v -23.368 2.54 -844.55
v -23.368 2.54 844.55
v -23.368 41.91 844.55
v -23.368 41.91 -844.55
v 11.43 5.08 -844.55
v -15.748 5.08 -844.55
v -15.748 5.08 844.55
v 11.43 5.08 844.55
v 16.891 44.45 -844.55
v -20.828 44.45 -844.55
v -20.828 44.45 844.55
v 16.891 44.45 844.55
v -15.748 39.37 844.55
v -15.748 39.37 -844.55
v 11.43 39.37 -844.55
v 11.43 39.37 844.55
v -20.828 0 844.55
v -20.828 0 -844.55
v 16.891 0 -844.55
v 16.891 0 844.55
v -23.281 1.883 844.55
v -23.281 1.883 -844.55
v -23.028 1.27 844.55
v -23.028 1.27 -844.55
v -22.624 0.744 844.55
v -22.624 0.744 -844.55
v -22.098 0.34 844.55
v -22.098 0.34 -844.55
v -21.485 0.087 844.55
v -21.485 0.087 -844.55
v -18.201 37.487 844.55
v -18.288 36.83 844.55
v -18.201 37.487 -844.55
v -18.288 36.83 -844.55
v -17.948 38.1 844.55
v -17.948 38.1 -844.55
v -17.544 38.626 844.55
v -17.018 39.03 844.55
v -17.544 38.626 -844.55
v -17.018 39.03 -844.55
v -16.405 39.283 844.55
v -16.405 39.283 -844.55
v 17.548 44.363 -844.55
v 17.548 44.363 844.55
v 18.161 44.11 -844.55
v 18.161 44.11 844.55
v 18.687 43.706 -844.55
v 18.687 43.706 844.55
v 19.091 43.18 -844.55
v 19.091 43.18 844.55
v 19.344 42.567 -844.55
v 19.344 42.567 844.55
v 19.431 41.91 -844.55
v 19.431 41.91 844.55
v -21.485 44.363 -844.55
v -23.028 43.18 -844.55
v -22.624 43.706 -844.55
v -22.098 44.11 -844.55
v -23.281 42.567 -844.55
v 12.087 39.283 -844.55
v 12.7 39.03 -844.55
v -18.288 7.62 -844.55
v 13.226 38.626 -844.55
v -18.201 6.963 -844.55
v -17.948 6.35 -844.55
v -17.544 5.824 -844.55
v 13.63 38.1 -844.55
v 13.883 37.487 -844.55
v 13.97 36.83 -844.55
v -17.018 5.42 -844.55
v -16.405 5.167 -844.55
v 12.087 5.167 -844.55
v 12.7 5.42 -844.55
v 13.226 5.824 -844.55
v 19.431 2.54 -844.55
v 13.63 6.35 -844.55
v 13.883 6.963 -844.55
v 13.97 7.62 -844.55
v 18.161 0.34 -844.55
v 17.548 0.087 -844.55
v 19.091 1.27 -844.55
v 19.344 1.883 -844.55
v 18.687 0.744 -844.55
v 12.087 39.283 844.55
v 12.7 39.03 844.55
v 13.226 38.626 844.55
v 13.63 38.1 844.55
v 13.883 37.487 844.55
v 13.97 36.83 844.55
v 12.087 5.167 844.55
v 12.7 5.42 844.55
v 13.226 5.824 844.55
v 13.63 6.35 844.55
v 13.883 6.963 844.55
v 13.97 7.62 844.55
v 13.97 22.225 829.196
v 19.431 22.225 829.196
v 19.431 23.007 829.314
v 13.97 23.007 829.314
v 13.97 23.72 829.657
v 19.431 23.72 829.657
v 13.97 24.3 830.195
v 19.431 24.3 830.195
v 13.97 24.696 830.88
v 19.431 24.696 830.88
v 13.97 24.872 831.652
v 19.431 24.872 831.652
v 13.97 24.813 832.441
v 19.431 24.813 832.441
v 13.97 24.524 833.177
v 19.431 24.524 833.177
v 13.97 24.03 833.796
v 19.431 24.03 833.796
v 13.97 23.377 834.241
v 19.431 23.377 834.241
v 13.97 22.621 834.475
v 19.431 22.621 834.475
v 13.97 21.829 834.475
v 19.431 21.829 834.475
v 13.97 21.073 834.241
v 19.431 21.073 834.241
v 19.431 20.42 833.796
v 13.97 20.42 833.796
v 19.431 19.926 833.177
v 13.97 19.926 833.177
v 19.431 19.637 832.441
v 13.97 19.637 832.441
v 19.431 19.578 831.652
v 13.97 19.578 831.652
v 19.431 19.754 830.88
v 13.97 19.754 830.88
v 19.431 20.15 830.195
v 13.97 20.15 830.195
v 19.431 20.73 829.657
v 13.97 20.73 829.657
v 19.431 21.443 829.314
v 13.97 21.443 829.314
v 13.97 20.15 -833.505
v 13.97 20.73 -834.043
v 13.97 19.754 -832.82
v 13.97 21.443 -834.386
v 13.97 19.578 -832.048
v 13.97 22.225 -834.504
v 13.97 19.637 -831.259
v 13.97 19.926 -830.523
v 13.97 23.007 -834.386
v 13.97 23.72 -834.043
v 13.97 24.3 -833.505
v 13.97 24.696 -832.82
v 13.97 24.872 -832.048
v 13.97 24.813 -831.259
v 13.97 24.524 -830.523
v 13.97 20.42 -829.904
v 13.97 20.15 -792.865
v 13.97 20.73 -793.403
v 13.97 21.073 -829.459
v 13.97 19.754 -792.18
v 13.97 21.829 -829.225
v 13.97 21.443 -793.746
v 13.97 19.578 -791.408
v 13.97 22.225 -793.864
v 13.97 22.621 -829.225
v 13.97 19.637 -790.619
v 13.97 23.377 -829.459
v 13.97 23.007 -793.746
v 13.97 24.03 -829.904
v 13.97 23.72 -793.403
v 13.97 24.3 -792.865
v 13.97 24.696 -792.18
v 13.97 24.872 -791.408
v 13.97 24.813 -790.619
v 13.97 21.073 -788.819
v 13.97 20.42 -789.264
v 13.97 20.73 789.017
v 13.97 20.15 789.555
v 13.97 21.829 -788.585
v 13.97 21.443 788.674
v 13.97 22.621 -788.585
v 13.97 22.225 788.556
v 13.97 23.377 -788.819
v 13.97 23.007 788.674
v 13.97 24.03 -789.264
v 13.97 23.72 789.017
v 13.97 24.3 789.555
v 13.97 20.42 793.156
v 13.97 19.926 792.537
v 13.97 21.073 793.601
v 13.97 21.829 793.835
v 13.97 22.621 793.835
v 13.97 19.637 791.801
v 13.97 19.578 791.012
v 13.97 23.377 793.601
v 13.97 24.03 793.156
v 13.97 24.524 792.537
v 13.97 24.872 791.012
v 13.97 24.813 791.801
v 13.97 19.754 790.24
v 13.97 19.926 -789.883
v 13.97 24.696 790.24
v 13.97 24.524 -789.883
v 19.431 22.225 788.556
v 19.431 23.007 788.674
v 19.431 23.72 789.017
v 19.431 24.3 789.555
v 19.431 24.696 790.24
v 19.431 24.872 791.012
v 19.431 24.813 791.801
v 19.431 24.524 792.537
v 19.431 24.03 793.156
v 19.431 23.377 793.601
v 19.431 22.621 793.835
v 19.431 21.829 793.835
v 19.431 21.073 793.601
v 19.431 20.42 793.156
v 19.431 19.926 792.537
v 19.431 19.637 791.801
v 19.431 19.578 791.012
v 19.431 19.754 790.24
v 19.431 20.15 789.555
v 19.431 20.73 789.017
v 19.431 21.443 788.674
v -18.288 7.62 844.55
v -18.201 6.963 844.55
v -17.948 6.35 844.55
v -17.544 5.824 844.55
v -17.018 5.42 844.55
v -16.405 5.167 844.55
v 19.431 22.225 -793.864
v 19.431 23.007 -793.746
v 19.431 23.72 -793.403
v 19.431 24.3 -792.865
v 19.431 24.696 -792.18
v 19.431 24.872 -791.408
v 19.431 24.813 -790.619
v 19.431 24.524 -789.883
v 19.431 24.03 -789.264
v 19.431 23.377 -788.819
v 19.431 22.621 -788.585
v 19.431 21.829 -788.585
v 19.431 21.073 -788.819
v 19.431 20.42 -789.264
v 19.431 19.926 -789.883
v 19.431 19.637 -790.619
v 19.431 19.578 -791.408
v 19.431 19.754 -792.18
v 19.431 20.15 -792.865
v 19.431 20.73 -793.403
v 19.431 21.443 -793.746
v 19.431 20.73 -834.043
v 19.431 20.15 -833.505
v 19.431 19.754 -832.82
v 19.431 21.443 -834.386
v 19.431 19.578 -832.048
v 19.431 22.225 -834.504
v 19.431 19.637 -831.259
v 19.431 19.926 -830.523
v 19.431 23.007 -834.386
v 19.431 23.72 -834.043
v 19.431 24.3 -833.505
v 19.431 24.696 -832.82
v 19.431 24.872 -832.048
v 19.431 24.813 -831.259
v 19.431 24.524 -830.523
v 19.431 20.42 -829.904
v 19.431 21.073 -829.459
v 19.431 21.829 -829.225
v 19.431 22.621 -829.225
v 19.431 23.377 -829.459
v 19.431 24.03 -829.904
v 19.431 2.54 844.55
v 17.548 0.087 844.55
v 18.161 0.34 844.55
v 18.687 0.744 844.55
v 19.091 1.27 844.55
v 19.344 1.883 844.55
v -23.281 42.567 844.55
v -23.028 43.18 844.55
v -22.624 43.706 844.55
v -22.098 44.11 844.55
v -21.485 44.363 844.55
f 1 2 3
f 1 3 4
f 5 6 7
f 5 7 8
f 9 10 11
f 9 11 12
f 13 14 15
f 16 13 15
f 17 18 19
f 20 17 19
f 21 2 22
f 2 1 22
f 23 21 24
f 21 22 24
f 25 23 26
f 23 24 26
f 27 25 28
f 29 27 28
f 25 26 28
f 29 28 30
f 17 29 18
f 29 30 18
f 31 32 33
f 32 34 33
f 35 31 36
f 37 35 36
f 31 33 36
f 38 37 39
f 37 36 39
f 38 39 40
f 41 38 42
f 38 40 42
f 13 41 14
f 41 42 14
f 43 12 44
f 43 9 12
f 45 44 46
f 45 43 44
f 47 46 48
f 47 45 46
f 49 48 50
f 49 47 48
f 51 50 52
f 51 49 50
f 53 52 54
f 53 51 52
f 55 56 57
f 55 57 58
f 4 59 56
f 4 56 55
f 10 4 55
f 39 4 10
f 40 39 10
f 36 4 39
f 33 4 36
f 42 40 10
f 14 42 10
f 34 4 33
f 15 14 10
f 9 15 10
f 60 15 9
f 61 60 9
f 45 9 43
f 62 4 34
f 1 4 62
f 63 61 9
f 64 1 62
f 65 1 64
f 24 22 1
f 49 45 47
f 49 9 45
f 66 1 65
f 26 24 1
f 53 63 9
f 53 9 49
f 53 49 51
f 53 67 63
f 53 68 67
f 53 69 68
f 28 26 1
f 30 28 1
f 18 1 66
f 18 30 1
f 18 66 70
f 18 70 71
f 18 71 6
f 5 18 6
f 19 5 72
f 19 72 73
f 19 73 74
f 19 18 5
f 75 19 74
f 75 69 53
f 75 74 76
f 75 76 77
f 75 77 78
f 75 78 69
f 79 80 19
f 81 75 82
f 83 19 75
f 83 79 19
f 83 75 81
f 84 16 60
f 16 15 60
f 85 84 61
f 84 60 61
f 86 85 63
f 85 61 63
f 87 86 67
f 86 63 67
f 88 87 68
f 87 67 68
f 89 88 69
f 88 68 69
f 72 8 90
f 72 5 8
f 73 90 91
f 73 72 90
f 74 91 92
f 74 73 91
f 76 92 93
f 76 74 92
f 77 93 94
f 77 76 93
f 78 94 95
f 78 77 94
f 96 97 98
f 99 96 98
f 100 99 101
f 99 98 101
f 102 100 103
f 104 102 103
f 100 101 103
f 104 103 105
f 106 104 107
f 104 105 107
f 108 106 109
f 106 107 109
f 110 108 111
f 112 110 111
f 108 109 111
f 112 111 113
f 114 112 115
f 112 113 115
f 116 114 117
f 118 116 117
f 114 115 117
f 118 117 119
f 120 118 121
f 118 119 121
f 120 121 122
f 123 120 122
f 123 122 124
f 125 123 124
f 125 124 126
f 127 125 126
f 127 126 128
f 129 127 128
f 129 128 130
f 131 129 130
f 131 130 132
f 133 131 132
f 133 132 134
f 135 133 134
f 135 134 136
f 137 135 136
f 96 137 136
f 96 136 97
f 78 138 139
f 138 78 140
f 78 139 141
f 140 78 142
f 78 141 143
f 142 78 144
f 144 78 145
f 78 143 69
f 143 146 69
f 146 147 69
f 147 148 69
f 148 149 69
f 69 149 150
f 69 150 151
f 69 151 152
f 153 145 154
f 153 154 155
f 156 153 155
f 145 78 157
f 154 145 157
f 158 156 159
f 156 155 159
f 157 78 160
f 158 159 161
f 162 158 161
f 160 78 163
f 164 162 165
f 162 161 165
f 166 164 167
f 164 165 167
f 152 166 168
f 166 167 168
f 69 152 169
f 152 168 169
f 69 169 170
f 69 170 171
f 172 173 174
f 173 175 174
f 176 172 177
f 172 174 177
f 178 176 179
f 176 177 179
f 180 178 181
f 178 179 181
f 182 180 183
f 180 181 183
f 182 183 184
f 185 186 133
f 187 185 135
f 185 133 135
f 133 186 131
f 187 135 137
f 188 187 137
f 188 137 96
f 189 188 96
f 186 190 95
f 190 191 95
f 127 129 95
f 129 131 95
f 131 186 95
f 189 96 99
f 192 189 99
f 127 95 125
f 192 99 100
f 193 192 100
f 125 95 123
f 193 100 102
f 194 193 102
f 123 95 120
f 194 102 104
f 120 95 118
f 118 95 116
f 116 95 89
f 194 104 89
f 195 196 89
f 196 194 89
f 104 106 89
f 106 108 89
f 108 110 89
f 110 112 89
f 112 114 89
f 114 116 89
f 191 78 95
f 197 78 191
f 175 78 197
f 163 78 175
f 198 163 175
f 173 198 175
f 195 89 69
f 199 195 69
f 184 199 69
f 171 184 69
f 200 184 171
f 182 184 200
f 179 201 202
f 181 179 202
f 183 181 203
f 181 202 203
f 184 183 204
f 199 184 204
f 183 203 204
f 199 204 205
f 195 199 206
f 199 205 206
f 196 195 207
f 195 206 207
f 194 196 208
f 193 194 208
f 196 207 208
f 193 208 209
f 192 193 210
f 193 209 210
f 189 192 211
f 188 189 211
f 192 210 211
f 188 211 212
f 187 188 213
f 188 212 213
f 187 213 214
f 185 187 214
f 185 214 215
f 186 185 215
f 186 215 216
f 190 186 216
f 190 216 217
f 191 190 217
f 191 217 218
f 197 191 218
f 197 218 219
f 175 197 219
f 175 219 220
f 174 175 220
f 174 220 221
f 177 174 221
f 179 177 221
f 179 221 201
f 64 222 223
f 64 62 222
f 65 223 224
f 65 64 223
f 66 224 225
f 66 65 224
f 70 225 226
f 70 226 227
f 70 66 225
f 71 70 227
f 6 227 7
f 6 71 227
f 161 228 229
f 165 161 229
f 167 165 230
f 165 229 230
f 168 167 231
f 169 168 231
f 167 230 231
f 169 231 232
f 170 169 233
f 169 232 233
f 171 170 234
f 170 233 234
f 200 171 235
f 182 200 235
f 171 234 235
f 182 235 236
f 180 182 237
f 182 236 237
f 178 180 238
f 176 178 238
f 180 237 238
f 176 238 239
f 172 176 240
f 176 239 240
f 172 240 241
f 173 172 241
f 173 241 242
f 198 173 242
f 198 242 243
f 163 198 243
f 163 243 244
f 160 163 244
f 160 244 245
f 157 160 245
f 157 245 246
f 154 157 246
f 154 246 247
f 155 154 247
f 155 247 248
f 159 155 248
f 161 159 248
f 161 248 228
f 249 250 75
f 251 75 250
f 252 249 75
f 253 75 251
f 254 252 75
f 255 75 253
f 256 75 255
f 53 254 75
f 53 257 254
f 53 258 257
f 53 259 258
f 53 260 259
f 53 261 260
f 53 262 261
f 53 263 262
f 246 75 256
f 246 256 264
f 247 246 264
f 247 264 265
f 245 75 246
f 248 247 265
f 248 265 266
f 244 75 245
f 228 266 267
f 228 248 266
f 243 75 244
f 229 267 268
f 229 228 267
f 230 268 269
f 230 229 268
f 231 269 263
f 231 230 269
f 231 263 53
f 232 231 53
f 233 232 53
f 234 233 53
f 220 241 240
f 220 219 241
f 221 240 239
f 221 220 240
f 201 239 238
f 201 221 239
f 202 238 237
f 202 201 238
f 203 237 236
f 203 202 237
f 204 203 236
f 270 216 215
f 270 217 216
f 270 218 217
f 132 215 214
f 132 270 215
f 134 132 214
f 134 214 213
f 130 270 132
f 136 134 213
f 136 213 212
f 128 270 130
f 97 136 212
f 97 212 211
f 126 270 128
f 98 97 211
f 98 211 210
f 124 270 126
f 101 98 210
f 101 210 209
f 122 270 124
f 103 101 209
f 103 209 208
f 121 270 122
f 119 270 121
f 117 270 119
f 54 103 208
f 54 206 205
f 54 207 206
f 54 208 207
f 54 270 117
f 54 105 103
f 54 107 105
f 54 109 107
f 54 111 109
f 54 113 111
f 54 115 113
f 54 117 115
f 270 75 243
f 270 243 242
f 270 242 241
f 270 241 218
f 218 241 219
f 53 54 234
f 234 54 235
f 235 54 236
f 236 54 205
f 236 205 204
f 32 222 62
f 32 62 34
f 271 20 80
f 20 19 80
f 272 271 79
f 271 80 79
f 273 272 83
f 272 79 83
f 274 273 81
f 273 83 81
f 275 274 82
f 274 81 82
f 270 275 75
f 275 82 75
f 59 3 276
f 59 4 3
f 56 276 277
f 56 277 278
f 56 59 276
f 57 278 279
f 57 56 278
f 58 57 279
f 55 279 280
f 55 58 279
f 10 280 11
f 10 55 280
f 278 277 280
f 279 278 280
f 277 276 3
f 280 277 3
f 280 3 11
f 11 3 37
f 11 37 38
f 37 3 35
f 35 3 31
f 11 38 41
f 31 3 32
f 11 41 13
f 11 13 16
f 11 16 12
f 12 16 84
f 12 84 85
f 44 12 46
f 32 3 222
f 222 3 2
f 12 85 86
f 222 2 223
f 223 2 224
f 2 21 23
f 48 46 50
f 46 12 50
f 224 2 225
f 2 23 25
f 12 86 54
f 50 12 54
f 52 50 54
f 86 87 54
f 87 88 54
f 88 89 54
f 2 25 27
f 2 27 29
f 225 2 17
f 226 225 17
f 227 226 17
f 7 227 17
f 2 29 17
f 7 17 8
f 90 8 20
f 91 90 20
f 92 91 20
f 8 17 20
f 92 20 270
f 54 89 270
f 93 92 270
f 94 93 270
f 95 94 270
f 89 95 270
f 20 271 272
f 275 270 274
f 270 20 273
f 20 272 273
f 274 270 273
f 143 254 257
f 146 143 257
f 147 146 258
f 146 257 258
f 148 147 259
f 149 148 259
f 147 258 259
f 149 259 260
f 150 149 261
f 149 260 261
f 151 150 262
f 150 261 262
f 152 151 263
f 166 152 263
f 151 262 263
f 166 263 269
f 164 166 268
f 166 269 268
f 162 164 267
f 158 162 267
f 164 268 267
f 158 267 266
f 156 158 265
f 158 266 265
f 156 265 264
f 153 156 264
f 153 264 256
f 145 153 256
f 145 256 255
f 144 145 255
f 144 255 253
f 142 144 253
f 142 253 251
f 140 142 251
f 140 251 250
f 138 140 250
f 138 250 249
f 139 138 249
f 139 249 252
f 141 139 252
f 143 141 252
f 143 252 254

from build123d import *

# Parameters (mm, degrees)
MAIN_W                         = 46.736
MAIN_H                         = 1689.1
EXTRUDE_MAIN_DEPTH             = 44.45
MAIN_CUT_W                     = 32.258
MAIN_CUT_H                     = 34.29
CUT_MAIN_DEPTH                 = 1690.846346839
SKETCH1_W                      = 3.937
SKETCH1_H                      = 44.45
CUT_EXTRUDE1_DEPTH             = 1690.846346839
F_4_0_209_DIAMETER_HOLE2_D     = 5.3086
F_4_0_209_DIAMETER_HOLE2_DEPTH = 5.461
FILLET1_R                      = 2.54


with BuildPart() as part:
    # Main → Extrude-Main (new body)
    with BuildSketch(Plane(origin=(0, 0, 0), x_dir=(1, 0, 0), z_dir=(0, 1, 0))):
        Rectangle(MAIN_W, MAIN_H)
    extrude(amount=EXTRUDE_MAIN_DEPTH)

    # Main Cut → Cut-Main (cut, through all)
    with BuildSketch(Plane.XY.offset(844.55)):
        with Locations((-2.159, 22.225)):
            Rectangle(MAIN_CUT_W, MAIN_CUT_H)
    extrude(amount=-CUT_MAIN_DEPTH, mode=Mode.SUBTRACT)

    # Sketch1 → Cut-Extrude1 (cut, through all)
    with BuildSketch(Plane.XY.offset(844.55)):
        with Locations((21.3995, 22.225)):
            Rectangle(SKETCH1_W, SKETCH1_H)
    extrude(amount=-CUT_EXTRUDE1_DEPTH, mode=Mode.SUBTRACT)

    # #4 (0.209) Diameter Hole2
    with Locations(Plane.ZY.offset(-13.97)):
        with Locations((831.85, 22.225), (-831.85, 22.225), (-791.21, 22.225), (791.21, 22.225)):
            Hole(F_4_0_209_DIAMETER_HOLE2_D / 2, depth=F_4_0_209_DIAMETER_HOLE2_DEPTH)

    # Fillet1
    fillet1_edges = [part.edges().sort_by_distance(p)[0] for p in [
        (-23.368, 44.45, 0),
        (-18.288, 5.08, 0),
        (-18.288, 39.37, 0),
        (13.97, 39.37, 0),
        (13.97, 5.08, 0),
        (19.431, 0, 0),
        (19.431, 44.45, 0),
        (-23.368, 0, 0),
    ]]
    fillet(fillet1_edges, radius=FILLET1_R)


solid = part.part
